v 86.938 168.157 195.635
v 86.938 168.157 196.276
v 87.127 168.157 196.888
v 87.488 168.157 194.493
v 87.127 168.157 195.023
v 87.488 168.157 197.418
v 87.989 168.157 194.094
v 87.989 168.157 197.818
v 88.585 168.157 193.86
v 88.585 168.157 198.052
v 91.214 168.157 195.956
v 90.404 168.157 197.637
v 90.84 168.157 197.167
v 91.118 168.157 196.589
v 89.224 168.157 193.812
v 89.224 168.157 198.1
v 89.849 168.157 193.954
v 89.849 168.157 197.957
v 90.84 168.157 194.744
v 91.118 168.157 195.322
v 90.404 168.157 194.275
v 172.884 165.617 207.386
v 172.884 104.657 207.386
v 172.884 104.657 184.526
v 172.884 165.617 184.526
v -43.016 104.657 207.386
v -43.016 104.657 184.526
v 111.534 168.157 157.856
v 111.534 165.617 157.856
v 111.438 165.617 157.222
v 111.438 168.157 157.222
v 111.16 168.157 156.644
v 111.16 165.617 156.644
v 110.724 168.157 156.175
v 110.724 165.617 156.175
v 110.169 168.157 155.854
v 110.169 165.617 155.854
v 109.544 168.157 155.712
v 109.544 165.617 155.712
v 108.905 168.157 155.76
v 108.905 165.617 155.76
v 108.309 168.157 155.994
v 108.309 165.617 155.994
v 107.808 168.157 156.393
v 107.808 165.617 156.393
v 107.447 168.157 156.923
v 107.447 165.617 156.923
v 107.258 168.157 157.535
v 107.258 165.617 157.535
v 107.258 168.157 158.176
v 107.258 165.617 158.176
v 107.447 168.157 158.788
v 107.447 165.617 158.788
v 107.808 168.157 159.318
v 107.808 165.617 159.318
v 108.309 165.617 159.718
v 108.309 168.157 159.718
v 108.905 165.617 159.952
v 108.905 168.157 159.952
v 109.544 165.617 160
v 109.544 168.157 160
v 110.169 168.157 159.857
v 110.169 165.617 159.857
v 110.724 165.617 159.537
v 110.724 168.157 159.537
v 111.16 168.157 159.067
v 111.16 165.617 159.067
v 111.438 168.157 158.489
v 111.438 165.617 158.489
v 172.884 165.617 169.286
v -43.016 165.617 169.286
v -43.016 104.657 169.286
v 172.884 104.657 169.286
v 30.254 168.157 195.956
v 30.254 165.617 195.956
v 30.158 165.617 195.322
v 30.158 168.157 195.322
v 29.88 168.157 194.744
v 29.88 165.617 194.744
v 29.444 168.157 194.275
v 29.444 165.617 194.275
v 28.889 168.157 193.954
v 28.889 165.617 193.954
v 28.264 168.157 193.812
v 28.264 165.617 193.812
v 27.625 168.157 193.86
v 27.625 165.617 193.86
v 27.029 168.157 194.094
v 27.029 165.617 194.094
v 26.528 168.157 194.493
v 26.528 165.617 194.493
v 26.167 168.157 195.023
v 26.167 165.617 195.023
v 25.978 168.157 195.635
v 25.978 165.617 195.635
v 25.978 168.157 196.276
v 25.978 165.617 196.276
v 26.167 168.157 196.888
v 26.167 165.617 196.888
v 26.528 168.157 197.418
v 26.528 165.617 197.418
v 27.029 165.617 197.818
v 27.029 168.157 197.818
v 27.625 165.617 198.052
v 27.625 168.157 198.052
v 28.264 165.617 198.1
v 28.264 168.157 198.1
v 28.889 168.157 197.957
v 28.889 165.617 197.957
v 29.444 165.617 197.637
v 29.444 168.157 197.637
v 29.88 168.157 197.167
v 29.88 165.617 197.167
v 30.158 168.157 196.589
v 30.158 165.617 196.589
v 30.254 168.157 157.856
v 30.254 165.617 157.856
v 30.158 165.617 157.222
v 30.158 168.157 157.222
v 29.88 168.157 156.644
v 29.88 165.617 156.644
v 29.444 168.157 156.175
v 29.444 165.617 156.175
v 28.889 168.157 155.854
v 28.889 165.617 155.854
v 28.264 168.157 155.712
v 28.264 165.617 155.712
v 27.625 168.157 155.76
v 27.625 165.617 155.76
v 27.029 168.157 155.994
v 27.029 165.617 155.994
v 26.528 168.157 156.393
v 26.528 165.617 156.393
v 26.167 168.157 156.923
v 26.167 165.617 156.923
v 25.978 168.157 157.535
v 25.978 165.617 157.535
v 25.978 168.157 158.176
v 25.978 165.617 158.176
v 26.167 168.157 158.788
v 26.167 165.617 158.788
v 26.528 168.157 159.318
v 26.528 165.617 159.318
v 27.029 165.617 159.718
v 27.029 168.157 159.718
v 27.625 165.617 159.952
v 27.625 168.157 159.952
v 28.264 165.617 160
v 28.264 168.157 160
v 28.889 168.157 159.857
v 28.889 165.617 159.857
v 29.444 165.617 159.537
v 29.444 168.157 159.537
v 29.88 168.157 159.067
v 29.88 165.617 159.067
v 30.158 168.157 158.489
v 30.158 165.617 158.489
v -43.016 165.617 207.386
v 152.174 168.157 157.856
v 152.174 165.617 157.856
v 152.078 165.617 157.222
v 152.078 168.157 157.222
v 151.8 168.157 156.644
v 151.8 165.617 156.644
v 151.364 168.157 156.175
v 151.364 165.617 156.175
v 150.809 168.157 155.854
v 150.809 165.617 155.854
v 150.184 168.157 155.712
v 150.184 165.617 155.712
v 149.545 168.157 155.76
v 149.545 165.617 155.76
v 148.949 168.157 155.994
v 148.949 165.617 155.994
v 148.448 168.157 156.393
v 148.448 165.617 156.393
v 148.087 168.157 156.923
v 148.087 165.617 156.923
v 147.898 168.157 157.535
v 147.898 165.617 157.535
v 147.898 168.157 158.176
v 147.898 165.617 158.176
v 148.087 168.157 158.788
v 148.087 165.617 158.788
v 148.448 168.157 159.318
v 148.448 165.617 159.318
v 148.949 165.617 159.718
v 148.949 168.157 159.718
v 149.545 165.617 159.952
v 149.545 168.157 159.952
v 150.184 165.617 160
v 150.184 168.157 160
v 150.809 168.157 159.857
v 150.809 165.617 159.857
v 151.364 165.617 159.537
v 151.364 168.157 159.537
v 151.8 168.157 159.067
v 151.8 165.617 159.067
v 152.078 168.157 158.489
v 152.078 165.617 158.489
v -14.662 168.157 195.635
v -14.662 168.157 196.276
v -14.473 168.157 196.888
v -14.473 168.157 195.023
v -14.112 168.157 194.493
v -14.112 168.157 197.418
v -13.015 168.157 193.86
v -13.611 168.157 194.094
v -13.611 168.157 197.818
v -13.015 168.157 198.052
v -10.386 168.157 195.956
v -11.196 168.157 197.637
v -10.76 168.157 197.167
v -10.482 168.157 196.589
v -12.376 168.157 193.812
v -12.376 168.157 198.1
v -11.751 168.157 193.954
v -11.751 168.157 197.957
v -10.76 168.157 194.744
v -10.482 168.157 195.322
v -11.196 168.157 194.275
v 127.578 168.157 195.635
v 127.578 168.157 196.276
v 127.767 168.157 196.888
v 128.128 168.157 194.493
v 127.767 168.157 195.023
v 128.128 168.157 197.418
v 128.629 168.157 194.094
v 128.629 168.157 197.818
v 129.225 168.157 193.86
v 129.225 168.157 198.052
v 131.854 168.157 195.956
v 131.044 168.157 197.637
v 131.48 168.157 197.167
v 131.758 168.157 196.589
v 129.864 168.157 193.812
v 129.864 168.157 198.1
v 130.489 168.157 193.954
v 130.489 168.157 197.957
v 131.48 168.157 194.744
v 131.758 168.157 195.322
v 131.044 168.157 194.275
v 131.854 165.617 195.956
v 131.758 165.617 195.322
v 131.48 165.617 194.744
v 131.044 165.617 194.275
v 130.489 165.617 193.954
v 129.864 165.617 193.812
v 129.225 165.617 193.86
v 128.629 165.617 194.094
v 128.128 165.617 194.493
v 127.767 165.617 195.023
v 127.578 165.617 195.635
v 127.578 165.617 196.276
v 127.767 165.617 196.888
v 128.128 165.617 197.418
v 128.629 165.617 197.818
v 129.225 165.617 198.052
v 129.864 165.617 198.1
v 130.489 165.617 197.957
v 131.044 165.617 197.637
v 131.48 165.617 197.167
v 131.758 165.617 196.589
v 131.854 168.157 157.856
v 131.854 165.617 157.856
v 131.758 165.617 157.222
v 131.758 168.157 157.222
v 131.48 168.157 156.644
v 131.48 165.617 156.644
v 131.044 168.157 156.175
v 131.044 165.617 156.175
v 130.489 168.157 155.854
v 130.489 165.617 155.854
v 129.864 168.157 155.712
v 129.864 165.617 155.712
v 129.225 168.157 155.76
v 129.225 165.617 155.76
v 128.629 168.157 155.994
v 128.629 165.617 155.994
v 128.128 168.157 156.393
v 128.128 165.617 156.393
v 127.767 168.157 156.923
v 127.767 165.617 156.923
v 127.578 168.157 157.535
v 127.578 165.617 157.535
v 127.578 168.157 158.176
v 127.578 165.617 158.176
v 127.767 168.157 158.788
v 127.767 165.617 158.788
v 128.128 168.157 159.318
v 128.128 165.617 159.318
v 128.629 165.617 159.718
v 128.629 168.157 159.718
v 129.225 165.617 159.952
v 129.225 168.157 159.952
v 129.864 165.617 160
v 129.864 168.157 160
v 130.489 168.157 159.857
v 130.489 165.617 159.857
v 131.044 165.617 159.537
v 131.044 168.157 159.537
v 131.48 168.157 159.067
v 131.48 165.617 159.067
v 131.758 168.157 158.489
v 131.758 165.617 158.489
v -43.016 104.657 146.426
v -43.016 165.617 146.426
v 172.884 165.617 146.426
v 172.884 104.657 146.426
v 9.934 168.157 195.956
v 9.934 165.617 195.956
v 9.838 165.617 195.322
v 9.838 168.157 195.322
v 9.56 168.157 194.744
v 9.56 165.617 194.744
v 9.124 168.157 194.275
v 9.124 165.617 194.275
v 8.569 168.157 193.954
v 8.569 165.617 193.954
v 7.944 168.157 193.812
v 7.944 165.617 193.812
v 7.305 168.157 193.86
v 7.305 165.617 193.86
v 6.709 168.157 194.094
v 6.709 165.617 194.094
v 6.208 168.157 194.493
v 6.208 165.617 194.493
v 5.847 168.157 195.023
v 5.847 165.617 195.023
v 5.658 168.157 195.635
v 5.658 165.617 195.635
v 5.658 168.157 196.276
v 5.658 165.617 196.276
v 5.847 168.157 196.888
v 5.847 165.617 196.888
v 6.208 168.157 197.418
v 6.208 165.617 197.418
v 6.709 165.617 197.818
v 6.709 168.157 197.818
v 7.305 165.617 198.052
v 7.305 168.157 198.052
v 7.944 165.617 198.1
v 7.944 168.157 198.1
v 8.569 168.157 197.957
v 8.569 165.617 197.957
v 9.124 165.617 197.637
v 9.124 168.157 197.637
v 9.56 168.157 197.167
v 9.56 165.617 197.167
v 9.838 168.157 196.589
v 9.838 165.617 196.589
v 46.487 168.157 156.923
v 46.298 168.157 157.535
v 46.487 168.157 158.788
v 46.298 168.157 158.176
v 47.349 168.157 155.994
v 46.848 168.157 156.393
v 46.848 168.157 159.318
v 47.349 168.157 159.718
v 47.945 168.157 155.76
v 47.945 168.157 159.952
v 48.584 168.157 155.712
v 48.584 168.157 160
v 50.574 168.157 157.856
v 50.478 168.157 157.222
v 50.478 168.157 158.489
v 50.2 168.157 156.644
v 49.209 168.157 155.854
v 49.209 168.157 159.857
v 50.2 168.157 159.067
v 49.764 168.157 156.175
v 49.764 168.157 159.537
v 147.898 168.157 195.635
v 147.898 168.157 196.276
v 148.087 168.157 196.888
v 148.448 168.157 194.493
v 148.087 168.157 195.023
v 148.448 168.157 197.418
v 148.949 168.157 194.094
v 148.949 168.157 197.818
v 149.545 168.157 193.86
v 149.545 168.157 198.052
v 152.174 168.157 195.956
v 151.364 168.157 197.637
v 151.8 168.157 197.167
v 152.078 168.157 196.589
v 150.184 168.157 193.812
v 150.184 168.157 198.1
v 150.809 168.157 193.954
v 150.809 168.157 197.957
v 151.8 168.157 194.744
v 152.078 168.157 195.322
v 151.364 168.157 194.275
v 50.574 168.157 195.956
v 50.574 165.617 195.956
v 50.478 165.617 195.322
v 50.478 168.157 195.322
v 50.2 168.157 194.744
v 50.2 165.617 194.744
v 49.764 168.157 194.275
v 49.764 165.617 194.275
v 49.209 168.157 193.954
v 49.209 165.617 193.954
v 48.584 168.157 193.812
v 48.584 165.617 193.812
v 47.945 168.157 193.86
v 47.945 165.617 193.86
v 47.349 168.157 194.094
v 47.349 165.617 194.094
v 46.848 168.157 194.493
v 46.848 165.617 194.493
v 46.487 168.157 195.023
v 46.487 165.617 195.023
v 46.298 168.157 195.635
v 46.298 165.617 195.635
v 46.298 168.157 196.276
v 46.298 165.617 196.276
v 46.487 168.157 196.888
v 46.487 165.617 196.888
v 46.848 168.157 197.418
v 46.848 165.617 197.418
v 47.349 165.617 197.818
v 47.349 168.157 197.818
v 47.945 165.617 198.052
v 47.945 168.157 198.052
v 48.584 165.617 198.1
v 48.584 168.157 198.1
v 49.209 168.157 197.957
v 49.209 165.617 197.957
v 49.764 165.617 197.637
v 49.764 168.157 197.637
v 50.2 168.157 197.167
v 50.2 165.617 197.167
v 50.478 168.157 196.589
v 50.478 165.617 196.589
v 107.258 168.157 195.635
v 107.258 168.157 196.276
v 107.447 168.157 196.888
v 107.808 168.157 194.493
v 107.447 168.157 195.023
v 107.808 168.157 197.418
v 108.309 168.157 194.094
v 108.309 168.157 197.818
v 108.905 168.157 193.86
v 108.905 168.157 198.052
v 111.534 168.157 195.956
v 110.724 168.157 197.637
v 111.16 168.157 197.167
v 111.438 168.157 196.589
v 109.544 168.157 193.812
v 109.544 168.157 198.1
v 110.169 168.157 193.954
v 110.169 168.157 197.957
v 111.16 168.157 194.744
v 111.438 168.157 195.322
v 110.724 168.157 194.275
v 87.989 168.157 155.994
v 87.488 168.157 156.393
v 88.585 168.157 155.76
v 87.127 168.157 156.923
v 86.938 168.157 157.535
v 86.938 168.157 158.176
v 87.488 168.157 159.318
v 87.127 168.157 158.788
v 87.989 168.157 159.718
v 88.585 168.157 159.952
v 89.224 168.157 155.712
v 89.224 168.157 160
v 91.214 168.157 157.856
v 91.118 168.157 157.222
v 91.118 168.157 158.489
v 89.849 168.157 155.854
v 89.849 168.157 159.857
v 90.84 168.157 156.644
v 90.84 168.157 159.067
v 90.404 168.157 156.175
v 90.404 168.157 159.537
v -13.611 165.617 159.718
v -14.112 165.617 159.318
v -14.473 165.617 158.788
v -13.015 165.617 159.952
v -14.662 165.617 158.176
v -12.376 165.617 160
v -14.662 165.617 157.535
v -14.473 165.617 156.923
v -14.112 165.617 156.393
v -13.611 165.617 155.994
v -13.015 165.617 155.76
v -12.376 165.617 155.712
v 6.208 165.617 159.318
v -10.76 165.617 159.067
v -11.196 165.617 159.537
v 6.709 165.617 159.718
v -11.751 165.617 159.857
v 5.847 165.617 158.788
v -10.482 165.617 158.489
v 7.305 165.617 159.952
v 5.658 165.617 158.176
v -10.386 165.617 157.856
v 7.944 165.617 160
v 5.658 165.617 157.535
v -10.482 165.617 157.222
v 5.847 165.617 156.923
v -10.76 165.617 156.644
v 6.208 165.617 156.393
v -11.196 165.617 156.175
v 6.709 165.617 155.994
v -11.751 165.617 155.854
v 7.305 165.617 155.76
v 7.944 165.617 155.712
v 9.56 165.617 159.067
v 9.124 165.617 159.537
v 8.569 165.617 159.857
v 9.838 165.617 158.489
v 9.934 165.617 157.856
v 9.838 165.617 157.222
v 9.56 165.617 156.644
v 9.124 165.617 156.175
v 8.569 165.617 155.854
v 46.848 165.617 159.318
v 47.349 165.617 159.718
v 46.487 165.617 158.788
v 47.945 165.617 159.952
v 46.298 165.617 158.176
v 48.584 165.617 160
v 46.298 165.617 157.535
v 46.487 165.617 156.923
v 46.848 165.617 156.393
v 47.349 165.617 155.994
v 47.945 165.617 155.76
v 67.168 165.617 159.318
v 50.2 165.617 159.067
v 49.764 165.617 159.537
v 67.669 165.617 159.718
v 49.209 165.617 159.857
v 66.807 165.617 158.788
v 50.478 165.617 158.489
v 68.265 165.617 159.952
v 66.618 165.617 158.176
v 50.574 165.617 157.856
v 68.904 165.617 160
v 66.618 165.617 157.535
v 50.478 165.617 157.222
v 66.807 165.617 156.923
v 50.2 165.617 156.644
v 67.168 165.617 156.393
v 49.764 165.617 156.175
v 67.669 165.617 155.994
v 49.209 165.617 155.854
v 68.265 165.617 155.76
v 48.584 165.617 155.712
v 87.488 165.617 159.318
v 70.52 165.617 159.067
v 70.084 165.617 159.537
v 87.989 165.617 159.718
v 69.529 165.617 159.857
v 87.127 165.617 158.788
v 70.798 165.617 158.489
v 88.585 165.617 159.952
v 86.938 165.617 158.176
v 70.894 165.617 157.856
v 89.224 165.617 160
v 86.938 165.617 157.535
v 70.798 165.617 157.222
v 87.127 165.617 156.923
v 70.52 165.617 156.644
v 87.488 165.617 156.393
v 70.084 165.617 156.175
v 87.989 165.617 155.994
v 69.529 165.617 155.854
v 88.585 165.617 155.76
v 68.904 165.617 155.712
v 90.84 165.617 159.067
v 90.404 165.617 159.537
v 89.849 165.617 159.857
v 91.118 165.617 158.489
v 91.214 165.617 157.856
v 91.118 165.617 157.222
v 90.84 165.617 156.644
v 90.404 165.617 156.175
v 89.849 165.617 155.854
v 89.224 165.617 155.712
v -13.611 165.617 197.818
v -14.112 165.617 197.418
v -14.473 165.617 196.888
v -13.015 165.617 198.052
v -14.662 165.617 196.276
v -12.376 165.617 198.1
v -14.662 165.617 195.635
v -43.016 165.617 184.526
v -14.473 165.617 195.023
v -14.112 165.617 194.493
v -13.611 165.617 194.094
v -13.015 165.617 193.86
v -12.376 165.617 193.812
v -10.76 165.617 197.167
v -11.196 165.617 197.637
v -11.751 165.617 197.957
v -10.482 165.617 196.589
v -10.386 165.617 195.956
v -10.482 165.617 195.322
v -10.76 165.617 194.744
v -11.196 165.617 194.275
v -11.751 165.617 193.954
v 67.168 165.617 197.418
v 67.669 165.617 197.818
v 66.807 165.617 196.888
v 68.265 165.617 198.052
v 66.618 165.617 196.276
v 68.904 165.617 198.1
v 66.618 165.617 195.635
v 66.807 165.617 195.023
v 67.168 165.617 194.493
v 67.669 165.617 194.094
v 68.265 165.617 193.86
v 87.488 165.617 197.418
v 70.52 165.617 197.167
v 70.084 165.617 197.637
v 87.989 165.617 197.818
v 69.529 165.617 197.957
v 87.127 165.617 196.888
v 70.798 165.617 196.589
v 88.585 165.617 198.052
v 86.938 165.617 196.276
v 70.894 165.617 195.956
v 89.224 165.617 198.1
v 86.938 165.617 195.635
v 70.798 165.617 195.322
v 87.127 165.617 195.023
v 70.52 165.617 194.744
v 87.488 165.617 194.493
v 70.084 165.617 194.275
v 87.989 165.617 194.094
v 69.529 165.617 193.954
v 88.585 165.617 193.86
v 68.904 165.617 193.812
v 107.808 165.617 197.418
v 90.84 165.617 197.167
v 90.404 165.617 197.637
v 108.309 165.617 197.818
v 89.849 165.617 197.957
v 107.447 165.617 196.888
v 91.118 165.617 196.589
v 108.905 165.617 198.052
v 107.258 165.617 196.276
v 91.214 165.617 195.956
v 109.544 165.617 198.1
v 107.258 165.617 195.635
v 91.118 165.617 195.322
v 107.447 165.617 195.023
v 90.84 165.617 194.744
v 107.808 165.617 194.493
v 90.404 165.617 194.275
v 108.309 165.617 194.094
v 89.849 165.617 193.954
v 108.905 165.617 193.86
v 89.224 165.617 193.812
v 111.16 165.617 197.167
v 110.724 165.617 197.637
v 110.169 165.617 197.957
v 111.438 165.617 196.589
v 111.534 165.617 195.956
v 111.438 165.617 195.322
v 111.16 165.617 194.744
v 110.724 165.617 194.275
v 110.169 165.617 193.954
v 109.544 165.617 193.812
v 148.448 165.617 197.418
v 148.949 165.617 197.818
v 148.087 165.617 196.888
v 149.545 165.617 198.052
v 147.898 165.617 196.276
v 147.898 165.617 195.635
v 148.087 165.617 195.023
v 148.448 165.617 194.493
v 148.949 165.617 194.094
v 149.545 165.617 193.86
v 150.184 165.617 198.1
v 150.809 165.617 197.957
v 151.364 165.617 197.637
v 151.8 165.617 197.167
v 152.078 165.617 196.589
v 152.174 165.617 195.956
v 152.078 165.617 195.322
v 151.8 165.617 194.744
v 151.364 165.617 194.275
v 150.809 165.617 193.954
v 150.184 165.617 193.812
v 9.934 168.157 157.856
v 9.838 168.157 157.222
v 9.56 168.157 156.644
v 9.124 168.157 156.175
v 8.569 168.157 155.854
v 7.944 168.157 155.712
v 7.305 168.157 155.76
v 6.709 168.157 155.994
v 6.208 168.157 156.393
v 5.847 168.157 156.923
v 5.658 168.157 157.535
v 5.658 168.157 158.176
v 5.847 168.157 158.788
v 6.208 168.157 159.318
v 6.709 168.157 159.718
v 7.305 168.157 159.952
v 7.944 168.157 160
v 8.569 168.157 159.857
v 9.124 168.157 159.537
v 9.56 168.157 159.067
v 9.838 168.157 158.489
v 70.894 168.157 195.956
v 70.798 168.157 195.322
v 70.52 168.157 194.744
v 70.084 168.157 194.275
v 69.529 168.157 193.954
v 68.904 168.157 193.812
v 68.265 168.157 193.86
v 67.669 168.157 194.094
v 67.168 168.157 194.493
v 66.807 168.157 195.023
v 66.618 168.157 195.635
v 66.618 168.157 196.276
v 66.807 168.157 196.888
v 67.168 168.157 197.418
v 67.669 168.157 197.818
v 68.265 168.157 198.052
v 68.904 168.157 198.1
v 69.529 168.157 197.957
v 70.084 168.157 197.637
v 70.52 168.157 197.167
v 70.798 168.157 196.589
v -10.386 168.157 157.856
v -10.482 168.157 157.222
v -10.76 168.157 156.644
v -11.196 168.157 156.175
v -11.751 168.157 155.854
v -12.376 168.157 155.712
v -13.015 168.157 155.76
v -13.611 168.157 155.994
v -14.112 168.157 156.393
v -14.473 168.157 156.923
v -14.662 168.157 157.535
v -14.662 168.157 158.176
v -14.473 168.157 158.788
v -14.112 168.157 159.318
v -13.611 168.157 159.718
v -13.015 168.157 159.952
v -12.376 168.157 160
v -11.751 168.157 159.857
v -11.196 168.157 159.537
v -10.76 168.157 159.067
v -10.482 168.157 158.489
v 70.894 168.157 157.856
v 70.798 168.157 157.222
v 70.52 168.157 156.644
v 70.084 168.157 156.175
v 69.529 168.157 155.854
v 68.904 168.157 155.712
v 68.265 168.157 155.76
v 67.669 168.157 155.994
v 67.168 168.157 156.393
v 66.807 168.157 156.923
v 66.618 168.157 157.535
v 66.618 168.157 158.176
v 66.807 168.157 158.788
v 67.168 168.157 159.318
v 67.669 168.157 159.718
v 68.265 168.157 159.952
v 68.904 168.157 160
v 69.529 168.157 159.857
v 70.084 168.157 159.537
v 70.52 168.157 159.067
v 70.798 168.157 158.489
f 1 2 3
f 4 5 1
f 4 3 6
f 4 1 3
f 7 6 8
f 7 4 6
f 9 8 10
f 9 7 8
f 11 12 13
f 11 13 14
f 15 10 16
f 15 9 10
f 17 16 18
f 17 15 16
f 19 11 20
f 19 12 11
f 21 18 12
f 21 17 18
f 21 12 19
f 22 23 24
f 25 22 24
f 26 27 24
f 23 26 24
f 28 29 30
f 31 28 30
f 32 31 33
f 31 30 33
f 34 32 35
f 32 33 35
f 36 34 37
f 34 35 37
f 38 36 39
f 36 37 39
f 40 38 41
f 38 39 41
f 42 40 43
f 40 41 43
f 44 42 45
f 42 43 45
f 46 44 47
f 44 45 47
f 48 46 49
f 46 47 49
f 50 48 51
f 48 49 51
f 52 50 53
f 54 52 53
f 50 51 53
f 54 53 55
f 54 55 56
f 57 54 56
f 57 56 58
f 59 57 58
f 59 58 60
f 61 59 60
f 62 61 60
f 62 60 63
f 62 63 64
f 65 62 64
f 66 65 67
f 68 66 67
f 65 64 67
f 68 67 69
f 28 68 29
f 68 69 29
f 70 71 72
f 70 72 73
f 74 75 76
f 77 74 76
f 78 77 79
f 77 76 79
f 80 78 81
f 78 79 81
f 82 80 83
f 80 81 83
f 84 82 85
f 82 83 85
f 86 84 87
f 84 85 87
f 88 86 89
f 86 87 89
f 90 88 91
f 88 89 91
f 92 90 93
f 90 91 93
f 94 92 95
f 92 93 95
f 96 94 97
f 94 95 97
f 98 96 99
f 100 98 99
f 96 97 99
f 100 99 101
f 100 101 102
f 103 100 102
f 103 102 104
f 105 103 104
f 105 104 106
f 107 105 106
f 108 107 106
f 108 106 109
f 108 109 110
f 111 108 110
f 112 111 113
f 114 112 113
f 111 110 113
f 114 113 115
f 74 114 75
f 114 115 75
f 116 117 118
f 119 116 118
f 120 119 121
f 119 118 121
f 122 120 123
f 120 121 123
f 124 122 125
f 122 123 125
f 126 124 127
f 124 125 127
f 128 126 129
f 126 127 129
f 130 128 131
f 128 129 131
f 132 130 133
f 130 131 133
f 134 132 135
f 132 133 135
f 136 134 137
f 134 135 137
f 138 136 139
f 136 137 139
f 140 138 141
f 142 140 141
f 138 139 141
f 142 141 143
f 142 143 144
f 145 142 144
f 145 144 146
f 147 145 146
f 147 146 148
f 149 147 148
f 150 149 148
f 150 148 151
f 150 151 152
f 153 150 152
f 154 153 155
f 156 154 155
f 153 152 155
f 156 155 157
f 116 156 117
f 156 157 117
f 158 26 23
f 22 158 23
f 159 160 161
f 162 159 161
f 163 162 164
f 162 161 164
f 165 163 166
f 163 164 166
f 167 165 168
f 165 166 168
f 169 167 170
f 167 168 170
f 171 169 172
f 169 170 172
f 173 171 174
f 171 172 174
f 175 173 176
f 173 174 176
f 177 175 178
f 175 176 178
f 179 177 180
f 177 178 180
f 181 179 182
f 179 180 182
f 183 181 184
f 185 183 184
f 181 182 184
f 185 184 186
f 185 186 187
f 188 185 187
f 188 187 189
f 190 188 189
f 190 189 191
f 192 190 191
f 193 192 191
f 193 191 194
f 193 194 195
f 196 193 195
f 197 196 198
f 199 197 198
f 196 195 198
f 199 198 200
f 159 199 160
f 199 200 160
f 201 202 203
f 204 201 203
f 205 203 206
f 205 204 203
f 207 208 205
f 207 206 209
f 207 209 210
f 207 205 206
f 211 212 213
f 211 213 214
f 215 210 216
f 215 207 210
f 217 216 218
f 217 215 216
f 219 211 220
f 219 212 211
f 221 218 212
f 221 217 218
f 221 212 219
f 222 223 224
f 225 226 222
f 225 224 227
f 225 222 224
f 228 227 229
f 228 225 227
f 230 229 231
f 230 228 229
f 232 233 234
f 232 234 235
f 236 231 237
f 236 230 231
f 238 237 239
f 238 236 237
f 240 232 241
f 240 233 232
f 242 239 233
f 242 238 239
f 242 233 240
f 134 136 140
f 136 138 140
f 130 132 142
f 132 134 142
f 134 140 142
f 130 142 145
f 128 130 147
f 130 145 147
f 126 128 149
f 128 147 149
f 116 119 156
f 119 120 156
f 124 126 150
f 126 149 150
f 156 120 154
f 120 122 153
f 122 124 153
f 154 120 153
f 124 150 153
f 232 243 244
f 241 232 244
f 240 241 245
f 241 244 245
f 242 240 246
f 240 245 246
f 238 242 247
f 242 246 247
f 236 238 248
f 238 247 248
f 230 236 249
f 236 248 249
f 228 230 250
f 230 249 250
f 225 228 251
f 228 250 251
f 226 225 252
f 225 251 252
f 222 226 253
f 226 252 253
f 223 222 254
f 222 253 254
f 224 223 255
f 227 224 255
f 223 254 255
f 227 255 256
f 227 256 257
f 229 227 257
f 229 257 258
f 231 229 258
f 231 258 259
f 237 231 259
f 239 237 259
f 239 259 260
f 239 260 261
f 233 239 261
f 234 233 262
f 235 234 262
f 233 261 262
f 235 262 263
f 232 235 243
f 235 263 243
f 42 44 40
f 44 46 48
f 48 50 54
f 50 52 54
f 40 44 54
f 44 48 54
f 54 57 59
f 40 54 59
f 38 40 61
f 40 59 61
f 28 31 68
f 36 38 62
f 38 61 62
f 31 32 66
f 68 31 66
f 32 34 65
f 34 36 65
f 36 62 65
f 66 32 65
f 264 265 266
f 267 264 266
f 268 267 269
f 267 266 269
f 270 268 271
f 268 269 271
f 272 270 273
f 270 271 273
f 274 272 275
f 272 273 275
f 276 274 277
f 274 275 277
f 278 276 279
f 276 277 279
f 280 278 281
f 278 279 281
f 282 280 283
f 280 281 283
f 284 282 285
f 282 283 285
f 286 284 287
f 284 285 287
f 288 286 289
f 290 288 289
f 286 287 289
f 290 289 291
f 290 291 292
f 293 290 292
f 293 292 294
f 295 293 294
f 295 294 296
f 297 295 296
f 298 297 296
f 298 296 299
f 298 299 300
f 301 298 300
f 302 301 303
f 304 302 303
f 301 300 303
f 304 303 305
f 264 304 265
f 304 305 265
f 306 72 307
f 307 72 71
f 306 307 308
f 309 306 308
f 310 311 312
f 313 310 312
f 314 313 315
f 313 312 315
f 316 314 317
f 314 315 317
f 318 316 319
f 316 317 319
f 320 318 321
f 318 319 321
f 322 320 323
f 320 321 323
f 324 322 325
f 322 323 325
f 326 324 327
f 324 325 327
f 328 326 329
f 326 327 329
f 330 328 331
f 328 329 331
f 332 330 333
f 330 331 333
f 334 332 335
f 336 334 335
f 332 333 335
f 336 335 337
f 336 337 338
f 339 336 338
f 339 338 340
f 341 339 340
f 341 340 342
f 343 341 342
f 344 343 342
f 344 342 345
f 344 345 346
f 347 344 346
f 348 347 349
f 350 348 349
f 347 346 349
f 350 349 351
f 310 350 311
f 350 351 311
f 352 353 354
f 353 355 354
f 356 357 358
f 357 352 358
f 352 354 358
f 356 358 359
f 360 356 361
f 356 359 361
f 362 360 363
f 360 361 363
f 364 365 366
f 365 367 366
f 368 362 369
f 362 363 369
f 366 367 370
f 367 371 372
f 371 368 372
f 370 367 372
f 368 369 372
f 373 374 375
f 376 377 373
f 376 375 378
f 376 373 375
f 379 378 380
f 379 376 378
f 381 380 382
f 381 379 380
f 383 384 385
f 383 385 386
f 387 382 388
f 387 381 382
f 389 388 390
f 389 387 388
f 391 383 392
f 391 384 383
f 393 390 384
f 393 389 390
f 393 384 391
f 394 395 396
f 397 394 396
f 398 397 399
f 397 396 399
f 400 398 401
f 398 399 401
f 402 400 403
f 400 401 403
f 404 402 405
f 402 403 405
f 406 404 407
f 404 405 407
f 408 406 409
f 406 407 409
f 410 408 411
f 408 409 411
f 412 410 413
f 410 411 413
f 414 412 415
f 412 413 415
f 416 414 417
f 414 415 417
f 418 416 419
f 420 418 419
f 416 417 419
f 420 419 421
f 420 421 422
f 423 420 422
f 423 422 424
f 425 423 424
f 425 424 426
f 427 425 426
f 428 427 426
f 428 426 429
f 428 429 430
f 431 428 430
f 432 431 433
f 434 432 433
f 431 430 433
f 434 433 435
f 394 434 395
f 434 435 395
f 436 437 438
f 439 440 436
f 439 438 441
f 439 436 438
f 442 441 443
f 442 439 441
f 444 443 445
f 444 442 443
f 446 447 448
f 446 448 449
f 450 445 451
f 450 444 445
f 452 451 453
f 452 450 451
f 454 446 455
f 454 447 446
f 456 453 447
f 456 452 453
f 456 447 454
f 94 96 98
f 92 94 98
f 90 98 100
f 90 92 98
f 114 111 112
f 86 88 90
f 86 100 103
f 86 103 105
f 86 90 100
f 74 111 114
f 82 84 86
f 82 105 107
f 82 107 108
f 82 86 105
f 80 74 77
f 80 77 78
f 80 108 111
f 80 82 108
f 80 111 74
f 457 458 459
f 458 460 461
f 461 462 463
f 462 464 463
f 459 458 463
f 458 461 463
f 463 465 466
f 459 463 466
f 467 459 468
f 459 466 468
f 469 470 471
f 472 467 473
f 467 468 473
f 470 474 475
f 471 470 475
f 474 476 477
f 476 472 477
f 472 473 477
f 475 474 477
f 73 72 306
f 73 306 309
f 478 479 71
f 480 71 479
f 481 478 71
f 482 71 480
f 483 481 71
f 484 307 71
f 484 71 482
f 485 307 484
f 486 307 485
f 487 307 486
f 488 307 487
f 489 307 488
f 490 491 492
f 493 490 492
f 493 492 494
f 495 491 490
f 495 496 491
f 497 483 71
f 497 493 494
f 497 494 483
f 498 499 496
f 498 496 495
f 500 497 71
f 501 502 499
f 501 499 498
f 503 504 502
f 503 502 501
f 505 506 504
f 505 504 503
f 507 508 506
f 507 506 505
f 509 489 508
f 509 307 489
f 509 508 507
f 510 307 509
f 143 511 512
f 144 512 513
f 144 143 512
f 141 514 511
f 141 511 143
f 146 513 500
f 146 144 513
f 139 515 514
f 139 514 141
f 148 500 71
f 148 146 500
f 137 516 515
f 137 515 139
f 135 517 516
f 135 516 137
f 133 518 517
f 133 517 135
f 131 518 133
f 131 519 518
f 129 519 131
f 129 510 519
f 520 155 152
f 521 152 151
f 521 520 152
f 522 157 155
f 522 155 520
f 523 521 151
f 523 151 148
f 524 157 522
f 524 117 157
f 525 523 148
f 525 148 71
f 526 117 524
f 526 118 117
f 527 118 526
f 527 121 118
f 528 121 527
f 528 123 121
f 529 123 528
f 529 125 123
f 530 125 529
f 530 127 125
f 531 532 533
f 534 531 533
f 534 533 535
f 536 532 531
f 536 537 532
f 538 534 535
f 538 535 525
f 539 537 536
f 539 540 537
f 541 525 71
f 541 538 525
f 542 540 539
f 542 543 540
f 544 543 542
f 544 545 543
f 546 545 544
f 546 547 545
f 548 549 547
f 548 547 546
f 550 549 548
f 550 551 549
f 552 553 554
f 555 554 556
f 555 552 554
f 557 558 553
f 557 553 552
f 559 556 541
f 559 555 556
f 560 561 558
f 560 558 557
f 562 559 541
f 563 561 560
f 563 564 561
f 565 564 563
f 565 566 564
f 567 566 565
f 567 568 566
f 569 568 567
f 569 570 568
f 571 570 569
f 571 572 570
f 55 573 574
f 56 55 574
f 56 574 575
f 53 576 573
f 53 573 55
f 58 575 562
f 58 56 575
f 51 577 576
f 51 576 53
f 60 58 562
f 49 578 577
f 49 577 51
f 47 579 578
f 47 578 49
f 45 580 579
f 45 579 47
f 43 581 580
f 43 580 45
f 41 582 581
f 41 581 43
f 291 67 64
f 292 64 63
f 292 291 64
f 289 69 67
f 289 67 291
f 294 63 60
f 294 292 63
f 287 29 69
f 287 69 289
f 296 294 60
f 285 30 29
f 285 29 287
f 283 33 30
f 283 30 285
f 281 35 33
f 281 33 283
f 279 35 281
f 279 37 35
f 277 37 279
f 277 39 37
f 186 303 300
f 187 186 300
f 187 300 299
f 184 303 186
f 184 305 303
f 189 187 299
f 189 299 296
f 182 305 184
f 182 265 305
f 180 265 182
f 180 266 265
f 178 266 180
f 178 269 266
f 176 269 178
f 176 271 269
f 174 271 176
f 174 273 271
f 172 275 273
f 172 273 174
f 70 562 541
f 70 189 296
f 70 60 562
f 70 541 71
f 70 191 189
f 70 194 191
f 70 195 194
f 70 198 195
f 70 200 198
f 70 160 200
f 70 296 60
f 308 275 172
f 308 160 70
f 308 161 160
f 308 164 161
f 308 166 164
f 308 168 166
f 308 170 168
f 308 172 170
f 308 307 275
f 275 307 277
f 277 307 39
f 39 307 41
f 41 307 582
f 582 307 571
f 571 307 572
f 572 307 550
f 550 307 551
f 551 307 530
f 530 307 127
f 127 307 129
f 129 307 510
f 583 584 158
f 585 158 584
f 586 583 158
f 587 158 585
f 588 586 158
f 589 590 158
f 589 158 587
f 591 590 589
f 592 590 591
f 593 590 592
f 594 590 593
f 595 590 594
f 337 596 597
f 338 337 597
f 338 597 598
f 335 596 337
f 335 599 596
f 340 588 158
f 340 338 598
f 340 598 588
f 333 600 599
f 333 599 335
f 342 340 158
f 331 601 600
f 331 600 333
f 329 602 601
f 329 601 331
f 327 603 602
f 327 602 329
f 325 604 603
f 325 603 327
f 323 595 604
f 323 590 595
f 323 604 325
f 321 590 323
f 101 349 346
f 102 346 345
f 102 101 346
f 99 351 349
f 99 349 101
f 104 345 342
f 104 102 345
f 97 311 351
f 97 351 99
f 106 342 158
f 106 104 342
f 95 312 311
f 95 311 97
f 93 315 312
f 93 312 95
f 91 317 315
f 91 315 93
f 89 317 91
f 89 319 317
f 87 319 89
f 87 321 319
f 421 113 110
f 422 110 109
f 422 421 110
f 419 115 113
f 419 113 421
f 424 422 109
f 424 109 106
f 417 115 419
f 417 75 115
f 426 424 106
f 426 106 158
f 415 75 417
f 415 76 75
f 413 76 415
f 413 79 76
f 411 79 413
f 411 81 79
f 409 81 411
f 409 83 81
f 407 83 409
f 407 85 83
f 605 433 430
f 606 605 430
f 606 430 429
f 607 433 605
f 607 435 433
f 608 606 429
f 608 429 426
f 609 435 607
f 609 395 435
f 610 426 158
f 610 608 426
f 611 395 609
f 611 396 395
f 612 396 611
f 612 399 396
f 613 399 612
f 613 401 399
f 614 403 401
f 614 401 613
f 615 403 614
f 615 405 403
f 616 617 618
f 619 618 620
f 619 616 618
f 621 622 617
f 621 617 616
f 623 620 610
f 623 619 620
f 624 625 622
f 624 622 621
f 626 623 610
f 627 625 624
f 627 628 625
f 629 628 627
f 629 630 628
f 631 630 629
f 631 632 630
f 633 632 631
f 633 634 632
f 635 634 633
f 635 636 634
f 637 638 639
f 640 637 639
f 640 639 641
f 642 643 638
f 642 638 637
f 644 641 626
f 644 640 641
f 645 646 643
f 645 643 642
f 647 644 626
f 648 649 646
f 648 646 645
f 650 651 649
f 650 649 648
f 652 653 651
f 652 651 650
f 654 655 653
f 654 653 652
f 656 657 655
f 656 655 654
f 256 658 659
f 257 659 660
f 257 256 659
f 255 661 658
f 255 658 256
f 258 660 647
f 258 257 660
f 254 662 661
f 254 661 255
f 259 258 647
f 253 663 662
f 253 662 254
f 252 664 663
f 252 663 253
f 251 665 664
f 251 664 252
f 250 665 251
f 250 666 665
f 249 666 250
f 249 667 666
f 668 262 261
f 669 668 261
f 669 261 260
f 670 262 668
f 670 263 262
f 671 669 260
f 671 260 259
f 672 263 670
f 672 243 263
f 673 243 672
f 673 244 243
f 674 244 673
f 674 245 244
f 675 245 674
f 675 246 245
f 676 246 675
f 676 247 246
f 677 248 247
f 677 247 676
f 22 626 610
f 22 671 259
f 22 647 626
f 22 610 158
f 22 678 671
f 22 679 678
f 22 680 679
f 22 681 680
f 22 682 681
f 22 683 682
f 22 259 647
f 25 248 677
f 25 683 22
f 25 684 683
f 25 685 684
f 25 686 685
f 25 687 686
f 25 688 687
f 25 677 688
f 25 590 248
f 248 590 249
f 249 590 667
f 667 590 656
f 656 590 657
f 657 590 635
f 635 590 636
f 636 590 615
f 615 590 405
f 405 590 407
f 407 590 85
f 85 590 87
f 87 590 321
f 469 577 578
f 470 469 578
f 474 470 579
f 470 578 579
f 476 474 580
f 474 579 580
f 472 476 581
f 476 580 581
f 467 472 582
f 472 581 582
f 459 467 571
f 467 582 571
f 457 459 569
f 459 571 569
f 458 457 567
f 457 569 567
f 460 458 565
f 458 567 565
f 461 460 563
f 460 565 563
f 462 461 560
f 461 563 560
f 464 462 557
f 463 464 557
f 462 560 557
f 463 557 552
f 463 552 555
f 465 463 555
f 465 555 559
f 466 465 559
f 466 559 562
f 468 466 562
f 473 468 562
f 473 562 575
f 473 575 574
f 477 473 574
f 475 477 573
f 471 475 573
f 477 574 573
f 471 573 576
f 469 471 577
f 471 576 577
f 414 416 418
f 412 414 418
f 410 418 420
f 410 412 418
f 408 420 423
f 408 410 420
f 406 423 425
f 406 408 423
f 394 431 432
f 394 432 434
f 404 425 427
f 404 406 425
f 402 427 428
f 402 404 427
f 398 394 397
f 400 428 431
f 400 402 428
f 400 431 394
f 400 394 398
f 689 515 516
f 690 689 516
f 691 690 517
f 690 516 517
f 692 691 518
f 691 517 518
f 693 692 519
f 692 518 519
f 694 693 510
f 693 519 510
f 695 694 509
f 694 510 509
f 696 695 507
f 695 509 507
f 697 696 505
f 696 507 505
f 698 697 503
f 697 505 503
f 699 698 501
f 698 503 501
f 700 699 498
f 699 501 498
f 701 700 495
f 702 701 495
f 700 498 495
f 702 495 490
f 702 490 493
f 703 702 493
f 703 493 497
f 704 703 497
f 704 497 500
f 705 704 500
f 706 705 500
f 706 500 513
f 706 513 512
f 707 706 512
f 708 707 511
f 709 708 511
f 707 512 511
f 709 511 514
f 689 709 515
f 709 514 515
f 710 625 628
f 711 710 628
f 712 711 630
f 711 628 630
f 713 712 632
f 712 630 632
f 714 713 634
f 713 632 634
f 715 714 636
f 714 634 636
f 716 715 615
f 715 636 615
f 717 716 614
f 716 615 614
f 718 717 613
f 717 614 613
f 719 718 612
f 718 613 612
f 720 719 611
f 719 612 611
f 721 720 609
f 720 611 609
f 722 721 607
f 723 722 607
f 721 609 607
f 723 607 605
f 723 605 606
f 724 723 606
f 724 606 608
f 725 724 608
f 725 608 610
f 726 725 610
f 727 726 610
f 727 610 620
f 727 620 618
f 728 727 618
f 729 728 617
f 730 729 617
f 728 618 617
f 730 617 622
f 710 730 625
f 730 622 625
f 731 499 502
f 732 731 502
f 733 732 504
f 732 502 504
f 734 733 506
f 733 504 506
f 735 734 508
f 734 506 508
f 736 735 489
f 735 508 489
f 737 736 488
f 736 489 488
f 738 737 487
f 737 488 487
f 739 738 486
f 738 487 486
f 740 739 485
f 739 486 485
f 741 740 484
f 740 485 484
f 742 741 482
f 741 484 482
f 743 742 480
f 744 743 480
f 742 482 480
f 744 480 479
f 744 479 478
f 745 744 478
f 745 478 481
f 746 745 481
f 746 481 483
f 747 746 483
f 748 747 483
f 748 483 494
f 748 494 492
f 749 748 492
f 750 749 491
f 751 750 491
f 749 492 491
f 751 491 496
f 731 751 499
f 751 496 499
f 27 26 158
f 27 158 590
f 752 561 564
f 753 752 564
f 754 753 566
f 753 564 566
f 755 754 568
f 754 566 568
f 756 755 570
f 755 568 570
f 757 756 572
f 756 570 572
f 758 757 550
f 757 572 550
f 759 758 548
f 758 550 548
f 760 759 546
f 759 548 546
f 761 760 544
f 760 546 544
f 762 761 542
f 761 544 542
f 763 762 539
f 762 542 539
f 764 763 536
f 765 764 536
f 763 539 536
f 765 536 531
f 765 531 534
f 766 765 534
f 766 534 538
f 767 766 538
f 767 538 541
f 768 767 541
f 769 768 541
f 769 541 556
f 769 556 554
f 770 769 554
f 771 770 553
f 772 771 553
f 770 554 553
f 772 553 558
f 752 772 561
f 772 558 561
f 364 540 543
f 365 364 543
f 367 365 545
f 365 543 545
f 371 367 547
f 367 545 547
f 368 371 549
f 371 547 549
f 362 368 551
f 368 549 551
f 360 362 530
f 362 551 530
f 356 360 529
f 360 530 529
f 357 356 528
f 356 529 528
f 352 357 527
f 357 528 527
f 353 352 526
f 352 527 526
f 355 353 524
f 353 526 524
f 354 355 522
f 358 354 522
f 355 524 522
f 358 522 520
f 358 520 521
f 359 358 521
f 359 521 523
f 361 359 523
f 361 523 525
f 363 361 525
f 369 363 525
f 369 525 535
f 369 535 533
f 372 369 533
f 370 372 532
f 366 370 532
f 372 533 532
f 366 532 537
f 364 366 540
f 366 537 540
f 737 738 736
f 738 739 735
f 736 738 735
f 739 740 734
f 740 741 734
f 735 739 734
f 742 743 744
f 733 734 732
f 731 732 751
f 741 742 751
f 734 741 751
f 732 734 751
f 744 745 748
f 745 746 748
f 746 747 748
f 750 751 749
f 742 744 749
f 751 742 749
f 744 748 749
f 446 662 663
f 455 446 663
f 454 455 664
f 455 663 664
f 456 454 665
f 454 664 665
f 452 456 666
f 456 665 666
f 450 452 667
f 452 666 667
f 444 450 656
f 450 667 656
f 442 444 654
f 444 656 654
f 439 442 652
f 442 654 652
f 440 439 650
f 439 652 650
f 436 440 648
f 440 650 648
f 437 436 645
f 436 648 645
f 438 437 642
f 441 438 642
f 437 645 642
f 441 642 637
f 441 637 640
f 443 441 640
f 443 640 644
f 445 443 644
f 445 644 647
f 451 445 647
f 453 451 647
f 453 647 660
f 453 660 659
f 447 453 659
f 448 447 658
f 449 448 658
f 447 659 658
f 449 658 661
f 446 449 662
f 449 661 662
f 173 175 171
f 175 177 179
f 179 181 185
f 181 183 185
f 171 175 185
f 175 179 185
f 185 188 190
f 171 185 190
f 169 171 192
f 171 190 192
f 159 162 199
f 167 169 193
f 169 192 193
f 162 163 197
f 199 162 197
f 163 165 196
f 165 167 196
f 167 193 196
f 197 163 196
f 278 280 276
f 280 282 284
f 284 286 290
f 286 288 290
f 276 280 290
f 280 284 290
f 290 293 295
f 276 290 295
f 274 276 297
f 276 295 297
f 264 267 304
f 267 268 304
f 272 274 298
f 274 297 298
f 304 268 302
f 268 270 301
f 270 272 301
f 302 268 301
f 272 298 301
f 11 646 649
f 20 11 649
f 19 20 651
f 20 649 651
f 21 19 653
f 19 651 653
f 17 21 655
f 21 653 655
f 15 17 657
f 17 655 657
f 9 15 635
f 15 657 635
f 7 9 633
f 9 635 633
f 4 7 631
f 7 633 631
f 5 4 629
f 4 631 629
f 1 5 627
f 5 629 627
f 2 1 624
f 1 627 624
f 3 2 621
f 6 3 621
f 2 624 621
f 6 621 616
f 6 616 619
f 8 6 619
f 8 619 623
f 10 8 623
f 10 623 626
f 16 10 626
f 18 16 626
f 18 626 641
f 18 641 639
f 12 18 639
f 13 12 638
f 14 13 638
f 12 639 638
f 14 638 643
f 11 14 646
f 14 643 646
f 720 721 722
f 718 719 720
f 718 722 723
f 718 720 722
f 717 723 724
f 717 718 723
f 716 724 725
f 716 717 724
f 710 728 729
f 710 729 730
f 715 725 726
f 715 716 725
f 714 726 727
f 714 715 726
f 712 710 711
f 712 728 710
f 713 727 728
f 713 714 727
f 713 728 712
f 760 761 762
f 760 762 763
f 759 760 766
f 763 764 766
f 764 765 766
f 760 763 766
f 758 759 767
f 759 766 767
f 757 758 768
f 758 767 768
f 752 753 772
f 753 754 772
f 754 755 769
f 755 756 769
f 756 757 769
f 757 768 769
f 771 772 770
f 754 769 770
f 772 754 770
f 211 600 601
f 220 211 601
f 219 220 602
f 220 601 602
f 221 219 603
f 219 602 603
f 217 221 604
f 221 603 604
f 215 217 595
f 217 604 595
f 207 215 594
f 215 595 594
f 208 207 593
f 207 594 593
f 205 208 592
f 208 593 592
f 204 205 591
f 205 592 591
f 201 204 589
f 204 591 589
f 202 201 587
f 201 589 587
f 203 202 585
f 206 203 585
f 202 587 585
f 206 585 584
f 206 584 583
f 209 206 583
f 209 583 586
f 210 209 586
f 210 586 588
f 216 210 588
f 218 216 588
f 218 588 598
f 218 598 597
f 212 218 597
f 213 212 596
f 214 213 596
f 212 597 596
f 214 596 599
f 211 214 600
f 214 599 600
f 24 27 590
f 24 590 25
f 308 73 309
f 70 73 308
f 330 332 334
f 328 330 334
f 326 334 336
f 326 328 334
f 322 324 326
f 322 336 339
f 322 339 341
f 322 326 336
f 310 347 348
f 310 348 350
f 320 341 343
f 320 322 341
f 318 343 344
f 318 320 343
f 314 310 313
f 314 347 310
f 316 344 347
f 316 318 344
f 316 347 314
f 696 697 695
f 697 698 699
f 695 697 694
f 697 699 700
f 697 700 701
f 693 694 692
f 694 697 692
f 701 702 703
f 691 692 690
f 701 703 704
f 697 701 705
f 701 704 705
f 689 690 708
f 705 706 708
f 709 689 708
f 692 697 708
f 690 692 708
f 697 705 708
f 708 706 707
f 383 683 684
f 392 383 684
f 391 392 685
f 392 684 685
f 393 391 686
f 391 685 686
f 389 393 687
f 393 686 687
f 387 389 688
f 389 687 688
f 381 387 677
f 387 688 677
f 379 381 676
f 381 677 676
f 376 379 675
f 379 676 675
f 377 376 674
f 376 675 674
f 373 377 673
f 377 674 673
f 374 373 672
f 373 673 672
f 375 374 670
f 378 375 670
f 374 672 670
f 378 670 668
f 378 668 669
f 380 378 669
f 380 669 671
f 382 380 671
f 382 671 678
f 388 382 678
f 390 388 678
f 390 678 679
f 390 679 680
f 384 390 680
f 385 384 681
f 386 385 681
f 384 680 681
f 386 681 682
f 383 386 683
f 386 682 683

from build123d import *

# Parameters (mm, degrees)
SKETCH1_W                = 215.9
SKETCH1_H                = 63.5
BOSS_EXTRUDE1_DEPTH      = 22.86
CUT_EXTRUDE1_START       = -2.54
CUT_EXTRUDE1_OUTLINE_W   = 215.9
CUT_EXTRUDE1_OUTLINE_H   = 22.86
CUT_EXTRUDE1_OUTLINE_R   = 2.15
CUT_EXTRUDE1_DEPTH       = 2.54
CUT_EXTRUDE1_START_2     = -63.5
CUT_EXTRUDE1_2_OUTLINE_W = 215.9
CUT_EXTRUDE1_2_OUTLINE_H = 22.86
CUT_EXTRUDE1_2_DEPTH     = 60.96
CUT_EXTRUDE1_3_OUTLINE_R = 2.15
CUT_EXTRUDE1_3_DEPTH     = 2.54


# Read off the part's stored shape, not the designer's step: Cut-Extrude1
with BuildPart() as part:
    # Sketch1 → Boss-Extrude1 (new body)
    with BuildSketch(Plane.XY.offset(169.285605486)):
        with Locations((64.933768792, 136.406845874)):
            Rectangle(SKETCH1_W, SKETCH1_H)
    extrude(amount=-BOSS_EXTRUDE1_DEPTH)

    # Cut-Extrude1 outline → Cut-Extrude1 (cut)
    with BuildSketch(Plane(origin=(0, 168.156845874, 0), x_dir=(1, 0, 0), z_dir=(0, 1, 0)).offset(CUT_EXTRUDE1_START)):
        with Locations((64.933768792, -157.855605486)):
            Rectangle(CUT_EXTRUDE1_OUTLINE_W, CUT_EXTRUDE1_OUTLINE_H)
        with Locations((-12.536231208, -157.855605486)):
            Circle(CUT_EXTRUDE1_OUTLINE_R, mode=Mode.SUBTRACT)
        with Locations((7.783768792, -157.855605486)):
            Circle(CUT_EXTRUDE1_OUTLINE_R, mode=Mode.SUBTRACT)
        with Locations((28.103768792, -157.855605486)):
            Circle(CUT_EXTRUDE1_OUTLINE_R, mode=Mode.SUBTRACT)
        with Locations((48.423768792, -157.855605486)):
            Circle(CUT_EXTRUDE1_OUTLINE_R, mode=Mode.SUBTRACT)
        with Locations((68.743768792, -157.855605486)):
            Circle(CUT_EXTRUDE1_OUTLINE_R, mode=Mode.SUBTRACT)
        with Locations((89.063768792, -157.855605486)):
            Circle(CUT_EXTRUDE1_OUTLINE_R, mode=Mode.SUBTRACT)
        with Locations((109.383768792, -157.855605486)):
            Circle(CUT_EXTRUDE1_OUTLINE_R, mode=Mode.SUBTRACT)
        with Locations((129.703768792, -157.855605486)):
            Circle(CUT_EXTRUDE1_OUTLINE_R, mode=Mode.SUBTRACT)
        with Locations((150.023768792, -157.855605486)):
            Circle(CUT_EXTRUDE1_OUTLINE_R, mode=Mode.SUBTRACT)
    extrude(amount=CUT_EXTRUDE1_DEPTH, mode=Mode.SUBTRACT)


with BuildPart() as body_2:
    # Cut-Extrude1 2 outline → Cut-Extrude1 2 (new body)
    with BuildSketch(Plane(origin=(0, 168.156845874, 0), x_dir=(1, 0, 0), z_dir=(0, 1, 0)).offset(CUT_EXTRUDE1_START_2)):
        with Locations((64.933768792, -195.955605486)):
            Rectangle(CUT_EXTRUDE1_2_OUTLINE_W, CUT_EXTRUDE1_2_OUTLINE_H)
    extrude(amount=CUT_EXTRUDE1_2_DEPTH)

    # Cut-Extrude1 3 outline → Cut-Extrude1 3 (add)
    with BuildSketch(Plane(origin=(0, 168.156845874, 0), x_dir=(1, 0, 0), z_dir=(0, 1, 0)).offset(CUT_EXTRUDE1_START)):
        with Locations((-12.536231208, -195.955605486)):
            Circle(CUT_EXTRUDE1_3_OUTLINE_R)
        with Locations((7.783768792, -195.955605486)):
            Circle(CUT_EXTRUDE1_3_OUTLINE_R)
        with Locations((28.103768792, -195.955605486)):
            Circle(CUT_EXTRUDE1_3_OUTLINE_R)
        with Locations((48.423768792, -195.955605486)):
            Circle(CUT_EXTRUDE1_3_OUTLINE_R)
        with Locations((68.743768792, -195.955605486)):
            Circle(CUT_EXTRUDE1_3_OUTLINE_R)
        with Locations((89.063768792, -195.955605486)):
            Circle(CUT_EXTRUDE1_3_OUTLINE_R)
        with Locations((109.383768792, -195.955605486)):
            Circle(CUT_EXTRUDE1_3_OUTLINE_R)
        with Locations((129.703768792, -195.955605486)):
            Circle(CUT_EXTRUDE1_3_OUTLINE_R)
        with Locations((150.023768792, -195.955605486)):
            Circle(CUT_EXTRUDE1_3_OUTLINE_R)
    extrude(amount=CUT_EXTRUDE1_3_DEPTH)


solid = Compound([part.part, body_2.part])
